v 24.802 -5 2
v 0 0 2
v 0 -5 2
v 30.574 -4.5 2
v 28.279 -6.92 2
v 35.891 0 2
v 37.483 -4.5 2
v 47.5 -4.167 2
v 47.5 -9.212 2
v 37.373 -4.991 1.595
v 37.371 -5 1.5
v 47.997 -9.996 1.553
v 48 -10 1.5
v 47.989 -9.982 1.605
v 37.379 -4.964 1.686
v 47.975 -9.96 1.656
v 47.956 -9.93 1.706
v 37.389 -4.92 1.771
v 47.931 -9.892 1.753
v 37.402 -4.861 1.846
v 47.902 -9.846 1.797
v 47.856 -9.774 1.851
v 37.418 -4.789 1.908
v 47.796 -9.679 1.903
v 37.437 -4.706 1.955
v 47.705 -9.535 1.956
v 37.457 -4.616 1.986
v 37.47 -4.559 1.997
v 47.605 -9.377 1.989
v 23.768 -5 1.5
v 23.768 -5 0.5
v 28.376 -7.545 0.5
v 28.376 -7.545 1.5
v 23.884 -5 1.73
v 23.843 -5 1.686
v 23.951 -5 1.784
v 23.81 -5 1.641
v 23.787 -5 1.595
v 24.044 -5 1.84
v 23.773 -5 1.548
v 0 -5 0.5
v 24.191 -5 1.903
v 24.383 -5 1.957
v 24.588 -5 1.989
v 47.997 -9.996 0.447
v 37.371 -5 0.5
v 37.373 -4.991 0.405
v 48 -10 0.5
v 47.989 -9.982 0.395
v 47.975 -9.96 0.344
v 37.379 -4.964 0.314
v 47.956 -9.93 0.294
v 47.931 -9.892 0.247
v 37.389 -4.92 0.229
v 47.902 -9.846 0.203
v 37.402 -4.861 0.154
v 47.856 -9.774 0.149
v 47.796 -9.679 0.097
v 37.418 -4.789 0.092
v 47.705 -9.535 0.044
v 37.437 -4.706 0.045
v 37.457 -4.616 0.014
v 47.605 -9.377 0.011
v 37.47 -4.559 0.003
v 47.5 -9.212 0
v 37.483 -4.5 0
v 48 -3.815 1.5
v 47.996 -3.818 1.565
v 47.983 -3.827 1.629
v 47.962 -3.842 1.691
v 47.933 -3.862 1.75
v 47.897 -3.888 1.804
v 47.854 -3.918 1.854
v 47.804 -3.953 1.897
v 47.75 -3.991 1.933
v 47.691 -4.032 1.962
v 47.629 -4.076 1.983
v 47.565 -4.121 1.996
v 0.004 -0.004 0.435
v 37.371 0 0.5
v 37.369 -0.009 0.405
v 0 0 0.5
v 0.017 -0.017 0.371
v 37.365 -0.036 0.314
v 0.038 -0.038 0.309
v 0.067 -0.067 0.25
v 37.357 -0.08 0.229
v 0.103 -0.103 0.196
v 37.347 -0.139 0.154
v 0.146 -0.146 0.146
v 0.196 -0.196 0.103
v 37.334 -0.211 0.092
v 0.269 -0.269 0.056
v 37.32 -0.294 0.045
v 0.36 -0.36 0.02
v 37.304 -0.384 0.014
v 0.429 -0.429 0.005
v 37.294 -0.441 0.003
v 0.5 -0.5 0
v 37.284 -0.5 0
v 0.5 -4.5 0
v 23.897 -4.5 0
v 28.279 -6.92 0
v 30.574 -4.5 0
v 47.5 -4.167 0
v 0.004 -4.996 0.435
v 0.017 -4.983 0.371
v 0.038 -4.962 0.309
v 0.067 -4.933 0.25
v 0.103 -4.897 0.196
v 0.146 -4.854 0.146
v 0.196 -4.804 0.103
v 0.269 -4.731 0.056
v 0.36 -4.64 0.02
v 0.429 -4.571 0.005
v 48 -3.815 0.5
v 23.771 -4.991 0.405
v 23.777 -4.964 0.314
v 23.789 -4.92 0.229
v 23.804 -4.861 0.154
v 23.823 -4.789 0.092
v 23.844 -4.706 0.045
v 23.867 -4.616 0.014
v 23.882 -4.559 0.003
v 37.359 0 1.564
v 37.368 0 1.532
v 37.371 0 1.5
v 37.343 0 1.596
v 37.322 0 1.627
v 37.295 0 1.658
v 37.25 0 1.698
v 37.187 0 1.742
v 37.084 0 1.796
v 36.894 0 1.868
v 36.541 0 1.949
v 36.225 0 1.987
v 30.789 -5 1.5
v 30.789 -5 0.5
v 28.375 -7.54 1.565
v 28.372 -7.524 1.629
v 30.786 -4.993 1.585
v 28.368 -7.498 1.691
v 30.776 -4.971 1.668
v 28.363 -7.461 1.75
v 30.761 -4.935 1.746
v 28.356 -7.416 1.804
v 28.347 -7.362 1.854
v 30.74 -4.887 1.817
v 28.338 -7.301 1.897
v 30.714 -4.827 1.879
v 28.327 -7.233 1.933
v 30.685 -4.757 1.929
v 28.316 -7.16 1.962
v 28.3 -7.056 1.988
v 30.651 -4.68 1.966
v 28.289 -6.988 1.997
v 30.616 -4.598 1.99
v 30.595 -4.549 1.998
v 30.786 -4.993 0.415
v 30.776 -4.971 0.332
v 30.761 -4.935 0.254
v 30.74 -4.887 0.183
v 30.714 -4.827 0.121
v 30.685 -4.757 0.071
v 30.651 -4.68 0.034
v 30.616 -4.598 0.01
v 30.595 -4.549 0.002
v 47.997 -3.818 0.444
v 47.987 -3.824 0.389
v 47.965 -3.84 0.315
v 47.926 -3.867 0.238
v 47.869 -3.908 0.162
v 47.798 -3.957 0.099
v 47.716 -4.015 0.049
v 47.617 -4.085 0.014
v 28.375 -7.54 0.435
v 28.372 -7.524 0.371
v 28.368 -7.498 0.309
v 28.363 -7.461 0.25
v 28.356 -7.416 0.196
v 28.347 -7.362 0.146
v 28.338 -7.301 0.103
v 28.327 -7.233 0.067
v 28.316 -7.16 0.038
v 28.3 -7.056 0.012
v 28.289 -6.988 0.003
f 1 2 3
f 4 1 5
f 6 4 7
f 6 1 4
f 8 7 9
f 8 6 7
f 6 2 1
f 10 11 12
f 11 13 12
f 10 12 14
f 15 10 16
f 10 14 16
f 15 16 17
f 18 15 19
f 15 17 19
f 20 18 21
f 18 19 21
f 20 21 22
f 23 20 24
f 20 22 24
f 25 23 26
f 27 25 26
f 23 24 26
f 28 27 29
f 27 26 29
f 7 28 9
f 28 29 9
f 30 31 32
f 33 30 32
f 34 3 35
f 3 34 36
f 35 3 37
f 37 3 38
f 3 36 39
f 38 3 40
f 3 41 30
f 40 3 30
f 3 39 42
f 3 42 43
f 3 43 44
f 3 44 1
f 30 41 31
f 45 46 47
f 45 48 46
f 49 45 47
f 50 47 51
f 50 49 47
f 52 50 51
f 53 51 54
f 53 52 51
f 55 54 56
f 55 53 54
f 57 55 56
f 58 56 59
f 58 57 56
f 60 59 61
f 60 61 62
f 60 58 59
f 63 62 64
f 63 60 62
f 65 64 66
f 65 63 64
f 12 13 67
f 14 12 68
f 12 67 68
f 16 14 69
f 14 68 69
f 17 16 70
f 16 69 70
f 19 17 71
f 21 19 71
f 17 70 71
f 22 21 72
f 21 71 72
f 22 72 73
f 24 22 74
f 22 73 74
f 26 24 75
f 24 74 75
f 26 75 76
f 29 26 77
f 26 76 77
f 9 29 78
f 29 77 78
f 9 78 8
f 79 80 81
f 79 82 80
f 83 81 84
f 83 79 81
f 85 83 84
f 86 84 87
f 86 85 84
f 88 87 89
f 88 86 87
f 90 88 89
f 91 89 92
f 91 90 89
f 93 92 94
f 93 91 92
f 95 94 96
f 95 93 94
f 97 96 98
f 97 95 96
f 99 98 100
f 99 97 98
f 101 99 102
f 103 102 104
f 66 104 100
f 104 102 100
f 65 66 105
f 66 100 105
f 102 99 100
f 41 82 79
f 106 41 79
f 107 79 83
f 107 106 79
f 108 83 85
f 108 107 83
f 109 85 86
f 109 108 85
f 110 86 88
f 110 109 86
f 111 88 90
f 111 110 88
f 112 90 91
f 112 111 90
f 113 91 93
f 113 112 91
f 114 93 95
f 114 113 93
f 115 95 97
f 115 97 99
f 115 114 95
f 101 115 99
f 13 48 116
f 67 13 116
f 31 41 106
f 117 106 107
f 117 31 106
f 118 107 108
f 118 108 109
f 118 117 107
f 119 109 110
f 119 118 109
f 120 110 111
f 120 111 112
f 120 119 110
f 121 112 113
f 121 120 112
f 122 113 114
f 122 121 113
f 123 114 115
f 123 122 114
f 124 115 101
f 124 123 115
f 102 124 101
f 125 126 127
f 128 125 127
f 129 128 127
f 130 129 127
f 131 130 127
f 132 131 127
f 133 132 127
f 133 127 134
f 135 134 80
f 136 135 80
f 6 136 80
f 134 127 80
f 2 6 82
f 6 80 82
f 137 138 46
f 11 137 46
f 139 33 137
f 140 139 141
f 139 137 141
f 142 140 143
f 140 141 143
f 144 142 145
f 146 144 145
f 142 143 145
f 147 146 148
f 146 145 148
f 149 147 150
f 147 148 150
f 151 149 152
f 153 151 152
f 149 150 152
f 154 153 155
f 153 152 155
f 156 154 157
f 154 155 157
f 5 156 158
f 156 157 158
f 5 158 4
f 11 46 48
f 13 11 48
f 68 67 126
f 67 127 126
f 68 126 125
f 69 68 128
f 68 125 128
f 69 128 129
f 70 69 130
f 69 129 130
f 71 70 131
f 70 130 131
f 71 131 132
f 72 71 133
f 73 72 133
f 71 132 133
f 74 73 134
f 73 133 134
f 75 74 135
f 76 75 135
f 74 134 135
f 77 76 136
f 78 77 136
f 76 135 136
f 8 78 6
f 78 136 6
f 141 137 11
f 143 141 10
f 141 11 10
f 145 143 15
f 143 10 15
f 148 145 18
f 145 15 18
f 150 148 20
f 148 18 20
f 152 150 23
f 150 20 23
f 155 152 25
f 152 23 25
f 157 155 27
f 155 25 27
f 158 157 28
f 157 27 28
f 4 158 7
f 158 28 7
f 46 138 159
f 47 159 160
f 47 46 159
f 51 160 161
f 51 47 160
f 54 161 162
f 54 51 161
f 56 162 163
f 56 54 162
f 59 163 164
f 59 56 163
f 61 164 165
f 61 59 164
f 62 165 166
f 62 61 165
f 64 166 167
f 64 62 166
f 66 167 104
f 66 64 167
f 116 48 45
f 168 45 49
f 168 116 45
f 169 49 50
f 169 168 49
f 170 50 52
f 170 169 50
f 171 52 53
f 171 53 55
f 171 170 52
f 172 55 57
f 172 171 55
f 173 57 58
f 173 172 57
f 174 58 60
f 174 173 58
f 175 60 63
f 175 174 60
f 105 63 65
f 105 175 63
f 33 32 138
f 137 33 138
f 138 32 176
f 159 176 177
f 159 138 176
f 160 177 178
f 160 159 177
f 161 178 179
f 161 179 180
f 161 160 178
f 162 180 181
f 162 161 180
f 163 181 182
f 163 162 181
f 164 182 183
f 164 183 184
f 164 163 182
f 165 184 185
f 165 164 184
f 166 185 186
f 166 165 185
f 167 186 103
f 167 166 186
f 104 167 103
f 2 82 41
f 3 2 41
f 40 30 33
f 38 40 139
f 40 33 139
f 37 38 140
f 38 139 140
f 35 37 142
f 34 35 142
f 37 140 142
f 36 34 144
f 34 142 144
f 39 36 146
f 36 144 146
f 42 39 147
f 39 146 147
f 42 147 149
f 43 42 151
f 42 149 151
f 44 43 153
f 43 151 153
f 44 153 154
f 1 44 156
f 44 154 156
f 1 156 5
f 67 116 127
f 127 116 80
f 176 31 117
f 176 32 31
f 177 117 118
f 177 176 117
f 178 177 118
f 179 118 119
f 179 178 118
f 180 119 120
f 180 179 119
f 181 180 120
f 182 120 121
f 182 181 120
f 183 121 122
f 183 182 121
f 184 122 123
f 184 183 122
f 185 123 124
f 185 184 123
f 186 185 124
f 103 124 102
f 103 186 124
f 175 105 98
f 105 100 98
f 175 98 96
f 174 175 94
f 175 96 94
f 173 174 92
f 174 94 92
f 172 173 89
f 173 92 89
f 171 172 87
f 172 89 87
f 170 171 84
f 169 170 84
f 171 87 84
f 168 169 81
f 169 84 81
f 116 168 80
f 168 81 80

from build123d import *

# Parameters (mm, degrees)
F1_DEPTH = 2
F2_R     = 0.5
F3_R     = 0.5


with BuildPart() as f1:
    # F0 (on Top) → F1 (new body)
    with BuildSketch(Plane.XY):
        Polygon((37.371002, 0), (0, 0), (0, -5), (23.76816, -5), (28.375575, -7.545115), (30.788982, -5), (37.371002, -5), (48, -10), (48, -3.815304), align=None)
    extrude(amount=F1_DEPTH)

    # F2
    f2_edges = [f1.edges().sort_by_distance(p)[0] for p in [
        (48, -6.907652, 2),
        (42.685501, -7.5, 2),
        (34.079992, -5, 2),
        (29.582279, -6.272558, 2),
        (26.071868, -6.272558, 2),
        (42.685501, -1.907652, 2),
    ]]
    fillet(f2_edges, radius=F2_R)

    # F3
    f3_edges = [f1.edges().sort_by_distance(p)[0] for p in [
        (11.88408, -5, 0),
        (26.071868, -6.272558, 0),
        (29.582279, -6.272558, 0),
        (34.079992, -5, 0),
        (42.685501, -7.5, 0),
        (18.685501, 0, 0),
        (42.685501, -1.907652, 0),
        (0, -2.5, 0),
        (48, -6.907652, 0),
    ]]
    fillet(f3_edges, radius=F3_R)


solid = f1.part
